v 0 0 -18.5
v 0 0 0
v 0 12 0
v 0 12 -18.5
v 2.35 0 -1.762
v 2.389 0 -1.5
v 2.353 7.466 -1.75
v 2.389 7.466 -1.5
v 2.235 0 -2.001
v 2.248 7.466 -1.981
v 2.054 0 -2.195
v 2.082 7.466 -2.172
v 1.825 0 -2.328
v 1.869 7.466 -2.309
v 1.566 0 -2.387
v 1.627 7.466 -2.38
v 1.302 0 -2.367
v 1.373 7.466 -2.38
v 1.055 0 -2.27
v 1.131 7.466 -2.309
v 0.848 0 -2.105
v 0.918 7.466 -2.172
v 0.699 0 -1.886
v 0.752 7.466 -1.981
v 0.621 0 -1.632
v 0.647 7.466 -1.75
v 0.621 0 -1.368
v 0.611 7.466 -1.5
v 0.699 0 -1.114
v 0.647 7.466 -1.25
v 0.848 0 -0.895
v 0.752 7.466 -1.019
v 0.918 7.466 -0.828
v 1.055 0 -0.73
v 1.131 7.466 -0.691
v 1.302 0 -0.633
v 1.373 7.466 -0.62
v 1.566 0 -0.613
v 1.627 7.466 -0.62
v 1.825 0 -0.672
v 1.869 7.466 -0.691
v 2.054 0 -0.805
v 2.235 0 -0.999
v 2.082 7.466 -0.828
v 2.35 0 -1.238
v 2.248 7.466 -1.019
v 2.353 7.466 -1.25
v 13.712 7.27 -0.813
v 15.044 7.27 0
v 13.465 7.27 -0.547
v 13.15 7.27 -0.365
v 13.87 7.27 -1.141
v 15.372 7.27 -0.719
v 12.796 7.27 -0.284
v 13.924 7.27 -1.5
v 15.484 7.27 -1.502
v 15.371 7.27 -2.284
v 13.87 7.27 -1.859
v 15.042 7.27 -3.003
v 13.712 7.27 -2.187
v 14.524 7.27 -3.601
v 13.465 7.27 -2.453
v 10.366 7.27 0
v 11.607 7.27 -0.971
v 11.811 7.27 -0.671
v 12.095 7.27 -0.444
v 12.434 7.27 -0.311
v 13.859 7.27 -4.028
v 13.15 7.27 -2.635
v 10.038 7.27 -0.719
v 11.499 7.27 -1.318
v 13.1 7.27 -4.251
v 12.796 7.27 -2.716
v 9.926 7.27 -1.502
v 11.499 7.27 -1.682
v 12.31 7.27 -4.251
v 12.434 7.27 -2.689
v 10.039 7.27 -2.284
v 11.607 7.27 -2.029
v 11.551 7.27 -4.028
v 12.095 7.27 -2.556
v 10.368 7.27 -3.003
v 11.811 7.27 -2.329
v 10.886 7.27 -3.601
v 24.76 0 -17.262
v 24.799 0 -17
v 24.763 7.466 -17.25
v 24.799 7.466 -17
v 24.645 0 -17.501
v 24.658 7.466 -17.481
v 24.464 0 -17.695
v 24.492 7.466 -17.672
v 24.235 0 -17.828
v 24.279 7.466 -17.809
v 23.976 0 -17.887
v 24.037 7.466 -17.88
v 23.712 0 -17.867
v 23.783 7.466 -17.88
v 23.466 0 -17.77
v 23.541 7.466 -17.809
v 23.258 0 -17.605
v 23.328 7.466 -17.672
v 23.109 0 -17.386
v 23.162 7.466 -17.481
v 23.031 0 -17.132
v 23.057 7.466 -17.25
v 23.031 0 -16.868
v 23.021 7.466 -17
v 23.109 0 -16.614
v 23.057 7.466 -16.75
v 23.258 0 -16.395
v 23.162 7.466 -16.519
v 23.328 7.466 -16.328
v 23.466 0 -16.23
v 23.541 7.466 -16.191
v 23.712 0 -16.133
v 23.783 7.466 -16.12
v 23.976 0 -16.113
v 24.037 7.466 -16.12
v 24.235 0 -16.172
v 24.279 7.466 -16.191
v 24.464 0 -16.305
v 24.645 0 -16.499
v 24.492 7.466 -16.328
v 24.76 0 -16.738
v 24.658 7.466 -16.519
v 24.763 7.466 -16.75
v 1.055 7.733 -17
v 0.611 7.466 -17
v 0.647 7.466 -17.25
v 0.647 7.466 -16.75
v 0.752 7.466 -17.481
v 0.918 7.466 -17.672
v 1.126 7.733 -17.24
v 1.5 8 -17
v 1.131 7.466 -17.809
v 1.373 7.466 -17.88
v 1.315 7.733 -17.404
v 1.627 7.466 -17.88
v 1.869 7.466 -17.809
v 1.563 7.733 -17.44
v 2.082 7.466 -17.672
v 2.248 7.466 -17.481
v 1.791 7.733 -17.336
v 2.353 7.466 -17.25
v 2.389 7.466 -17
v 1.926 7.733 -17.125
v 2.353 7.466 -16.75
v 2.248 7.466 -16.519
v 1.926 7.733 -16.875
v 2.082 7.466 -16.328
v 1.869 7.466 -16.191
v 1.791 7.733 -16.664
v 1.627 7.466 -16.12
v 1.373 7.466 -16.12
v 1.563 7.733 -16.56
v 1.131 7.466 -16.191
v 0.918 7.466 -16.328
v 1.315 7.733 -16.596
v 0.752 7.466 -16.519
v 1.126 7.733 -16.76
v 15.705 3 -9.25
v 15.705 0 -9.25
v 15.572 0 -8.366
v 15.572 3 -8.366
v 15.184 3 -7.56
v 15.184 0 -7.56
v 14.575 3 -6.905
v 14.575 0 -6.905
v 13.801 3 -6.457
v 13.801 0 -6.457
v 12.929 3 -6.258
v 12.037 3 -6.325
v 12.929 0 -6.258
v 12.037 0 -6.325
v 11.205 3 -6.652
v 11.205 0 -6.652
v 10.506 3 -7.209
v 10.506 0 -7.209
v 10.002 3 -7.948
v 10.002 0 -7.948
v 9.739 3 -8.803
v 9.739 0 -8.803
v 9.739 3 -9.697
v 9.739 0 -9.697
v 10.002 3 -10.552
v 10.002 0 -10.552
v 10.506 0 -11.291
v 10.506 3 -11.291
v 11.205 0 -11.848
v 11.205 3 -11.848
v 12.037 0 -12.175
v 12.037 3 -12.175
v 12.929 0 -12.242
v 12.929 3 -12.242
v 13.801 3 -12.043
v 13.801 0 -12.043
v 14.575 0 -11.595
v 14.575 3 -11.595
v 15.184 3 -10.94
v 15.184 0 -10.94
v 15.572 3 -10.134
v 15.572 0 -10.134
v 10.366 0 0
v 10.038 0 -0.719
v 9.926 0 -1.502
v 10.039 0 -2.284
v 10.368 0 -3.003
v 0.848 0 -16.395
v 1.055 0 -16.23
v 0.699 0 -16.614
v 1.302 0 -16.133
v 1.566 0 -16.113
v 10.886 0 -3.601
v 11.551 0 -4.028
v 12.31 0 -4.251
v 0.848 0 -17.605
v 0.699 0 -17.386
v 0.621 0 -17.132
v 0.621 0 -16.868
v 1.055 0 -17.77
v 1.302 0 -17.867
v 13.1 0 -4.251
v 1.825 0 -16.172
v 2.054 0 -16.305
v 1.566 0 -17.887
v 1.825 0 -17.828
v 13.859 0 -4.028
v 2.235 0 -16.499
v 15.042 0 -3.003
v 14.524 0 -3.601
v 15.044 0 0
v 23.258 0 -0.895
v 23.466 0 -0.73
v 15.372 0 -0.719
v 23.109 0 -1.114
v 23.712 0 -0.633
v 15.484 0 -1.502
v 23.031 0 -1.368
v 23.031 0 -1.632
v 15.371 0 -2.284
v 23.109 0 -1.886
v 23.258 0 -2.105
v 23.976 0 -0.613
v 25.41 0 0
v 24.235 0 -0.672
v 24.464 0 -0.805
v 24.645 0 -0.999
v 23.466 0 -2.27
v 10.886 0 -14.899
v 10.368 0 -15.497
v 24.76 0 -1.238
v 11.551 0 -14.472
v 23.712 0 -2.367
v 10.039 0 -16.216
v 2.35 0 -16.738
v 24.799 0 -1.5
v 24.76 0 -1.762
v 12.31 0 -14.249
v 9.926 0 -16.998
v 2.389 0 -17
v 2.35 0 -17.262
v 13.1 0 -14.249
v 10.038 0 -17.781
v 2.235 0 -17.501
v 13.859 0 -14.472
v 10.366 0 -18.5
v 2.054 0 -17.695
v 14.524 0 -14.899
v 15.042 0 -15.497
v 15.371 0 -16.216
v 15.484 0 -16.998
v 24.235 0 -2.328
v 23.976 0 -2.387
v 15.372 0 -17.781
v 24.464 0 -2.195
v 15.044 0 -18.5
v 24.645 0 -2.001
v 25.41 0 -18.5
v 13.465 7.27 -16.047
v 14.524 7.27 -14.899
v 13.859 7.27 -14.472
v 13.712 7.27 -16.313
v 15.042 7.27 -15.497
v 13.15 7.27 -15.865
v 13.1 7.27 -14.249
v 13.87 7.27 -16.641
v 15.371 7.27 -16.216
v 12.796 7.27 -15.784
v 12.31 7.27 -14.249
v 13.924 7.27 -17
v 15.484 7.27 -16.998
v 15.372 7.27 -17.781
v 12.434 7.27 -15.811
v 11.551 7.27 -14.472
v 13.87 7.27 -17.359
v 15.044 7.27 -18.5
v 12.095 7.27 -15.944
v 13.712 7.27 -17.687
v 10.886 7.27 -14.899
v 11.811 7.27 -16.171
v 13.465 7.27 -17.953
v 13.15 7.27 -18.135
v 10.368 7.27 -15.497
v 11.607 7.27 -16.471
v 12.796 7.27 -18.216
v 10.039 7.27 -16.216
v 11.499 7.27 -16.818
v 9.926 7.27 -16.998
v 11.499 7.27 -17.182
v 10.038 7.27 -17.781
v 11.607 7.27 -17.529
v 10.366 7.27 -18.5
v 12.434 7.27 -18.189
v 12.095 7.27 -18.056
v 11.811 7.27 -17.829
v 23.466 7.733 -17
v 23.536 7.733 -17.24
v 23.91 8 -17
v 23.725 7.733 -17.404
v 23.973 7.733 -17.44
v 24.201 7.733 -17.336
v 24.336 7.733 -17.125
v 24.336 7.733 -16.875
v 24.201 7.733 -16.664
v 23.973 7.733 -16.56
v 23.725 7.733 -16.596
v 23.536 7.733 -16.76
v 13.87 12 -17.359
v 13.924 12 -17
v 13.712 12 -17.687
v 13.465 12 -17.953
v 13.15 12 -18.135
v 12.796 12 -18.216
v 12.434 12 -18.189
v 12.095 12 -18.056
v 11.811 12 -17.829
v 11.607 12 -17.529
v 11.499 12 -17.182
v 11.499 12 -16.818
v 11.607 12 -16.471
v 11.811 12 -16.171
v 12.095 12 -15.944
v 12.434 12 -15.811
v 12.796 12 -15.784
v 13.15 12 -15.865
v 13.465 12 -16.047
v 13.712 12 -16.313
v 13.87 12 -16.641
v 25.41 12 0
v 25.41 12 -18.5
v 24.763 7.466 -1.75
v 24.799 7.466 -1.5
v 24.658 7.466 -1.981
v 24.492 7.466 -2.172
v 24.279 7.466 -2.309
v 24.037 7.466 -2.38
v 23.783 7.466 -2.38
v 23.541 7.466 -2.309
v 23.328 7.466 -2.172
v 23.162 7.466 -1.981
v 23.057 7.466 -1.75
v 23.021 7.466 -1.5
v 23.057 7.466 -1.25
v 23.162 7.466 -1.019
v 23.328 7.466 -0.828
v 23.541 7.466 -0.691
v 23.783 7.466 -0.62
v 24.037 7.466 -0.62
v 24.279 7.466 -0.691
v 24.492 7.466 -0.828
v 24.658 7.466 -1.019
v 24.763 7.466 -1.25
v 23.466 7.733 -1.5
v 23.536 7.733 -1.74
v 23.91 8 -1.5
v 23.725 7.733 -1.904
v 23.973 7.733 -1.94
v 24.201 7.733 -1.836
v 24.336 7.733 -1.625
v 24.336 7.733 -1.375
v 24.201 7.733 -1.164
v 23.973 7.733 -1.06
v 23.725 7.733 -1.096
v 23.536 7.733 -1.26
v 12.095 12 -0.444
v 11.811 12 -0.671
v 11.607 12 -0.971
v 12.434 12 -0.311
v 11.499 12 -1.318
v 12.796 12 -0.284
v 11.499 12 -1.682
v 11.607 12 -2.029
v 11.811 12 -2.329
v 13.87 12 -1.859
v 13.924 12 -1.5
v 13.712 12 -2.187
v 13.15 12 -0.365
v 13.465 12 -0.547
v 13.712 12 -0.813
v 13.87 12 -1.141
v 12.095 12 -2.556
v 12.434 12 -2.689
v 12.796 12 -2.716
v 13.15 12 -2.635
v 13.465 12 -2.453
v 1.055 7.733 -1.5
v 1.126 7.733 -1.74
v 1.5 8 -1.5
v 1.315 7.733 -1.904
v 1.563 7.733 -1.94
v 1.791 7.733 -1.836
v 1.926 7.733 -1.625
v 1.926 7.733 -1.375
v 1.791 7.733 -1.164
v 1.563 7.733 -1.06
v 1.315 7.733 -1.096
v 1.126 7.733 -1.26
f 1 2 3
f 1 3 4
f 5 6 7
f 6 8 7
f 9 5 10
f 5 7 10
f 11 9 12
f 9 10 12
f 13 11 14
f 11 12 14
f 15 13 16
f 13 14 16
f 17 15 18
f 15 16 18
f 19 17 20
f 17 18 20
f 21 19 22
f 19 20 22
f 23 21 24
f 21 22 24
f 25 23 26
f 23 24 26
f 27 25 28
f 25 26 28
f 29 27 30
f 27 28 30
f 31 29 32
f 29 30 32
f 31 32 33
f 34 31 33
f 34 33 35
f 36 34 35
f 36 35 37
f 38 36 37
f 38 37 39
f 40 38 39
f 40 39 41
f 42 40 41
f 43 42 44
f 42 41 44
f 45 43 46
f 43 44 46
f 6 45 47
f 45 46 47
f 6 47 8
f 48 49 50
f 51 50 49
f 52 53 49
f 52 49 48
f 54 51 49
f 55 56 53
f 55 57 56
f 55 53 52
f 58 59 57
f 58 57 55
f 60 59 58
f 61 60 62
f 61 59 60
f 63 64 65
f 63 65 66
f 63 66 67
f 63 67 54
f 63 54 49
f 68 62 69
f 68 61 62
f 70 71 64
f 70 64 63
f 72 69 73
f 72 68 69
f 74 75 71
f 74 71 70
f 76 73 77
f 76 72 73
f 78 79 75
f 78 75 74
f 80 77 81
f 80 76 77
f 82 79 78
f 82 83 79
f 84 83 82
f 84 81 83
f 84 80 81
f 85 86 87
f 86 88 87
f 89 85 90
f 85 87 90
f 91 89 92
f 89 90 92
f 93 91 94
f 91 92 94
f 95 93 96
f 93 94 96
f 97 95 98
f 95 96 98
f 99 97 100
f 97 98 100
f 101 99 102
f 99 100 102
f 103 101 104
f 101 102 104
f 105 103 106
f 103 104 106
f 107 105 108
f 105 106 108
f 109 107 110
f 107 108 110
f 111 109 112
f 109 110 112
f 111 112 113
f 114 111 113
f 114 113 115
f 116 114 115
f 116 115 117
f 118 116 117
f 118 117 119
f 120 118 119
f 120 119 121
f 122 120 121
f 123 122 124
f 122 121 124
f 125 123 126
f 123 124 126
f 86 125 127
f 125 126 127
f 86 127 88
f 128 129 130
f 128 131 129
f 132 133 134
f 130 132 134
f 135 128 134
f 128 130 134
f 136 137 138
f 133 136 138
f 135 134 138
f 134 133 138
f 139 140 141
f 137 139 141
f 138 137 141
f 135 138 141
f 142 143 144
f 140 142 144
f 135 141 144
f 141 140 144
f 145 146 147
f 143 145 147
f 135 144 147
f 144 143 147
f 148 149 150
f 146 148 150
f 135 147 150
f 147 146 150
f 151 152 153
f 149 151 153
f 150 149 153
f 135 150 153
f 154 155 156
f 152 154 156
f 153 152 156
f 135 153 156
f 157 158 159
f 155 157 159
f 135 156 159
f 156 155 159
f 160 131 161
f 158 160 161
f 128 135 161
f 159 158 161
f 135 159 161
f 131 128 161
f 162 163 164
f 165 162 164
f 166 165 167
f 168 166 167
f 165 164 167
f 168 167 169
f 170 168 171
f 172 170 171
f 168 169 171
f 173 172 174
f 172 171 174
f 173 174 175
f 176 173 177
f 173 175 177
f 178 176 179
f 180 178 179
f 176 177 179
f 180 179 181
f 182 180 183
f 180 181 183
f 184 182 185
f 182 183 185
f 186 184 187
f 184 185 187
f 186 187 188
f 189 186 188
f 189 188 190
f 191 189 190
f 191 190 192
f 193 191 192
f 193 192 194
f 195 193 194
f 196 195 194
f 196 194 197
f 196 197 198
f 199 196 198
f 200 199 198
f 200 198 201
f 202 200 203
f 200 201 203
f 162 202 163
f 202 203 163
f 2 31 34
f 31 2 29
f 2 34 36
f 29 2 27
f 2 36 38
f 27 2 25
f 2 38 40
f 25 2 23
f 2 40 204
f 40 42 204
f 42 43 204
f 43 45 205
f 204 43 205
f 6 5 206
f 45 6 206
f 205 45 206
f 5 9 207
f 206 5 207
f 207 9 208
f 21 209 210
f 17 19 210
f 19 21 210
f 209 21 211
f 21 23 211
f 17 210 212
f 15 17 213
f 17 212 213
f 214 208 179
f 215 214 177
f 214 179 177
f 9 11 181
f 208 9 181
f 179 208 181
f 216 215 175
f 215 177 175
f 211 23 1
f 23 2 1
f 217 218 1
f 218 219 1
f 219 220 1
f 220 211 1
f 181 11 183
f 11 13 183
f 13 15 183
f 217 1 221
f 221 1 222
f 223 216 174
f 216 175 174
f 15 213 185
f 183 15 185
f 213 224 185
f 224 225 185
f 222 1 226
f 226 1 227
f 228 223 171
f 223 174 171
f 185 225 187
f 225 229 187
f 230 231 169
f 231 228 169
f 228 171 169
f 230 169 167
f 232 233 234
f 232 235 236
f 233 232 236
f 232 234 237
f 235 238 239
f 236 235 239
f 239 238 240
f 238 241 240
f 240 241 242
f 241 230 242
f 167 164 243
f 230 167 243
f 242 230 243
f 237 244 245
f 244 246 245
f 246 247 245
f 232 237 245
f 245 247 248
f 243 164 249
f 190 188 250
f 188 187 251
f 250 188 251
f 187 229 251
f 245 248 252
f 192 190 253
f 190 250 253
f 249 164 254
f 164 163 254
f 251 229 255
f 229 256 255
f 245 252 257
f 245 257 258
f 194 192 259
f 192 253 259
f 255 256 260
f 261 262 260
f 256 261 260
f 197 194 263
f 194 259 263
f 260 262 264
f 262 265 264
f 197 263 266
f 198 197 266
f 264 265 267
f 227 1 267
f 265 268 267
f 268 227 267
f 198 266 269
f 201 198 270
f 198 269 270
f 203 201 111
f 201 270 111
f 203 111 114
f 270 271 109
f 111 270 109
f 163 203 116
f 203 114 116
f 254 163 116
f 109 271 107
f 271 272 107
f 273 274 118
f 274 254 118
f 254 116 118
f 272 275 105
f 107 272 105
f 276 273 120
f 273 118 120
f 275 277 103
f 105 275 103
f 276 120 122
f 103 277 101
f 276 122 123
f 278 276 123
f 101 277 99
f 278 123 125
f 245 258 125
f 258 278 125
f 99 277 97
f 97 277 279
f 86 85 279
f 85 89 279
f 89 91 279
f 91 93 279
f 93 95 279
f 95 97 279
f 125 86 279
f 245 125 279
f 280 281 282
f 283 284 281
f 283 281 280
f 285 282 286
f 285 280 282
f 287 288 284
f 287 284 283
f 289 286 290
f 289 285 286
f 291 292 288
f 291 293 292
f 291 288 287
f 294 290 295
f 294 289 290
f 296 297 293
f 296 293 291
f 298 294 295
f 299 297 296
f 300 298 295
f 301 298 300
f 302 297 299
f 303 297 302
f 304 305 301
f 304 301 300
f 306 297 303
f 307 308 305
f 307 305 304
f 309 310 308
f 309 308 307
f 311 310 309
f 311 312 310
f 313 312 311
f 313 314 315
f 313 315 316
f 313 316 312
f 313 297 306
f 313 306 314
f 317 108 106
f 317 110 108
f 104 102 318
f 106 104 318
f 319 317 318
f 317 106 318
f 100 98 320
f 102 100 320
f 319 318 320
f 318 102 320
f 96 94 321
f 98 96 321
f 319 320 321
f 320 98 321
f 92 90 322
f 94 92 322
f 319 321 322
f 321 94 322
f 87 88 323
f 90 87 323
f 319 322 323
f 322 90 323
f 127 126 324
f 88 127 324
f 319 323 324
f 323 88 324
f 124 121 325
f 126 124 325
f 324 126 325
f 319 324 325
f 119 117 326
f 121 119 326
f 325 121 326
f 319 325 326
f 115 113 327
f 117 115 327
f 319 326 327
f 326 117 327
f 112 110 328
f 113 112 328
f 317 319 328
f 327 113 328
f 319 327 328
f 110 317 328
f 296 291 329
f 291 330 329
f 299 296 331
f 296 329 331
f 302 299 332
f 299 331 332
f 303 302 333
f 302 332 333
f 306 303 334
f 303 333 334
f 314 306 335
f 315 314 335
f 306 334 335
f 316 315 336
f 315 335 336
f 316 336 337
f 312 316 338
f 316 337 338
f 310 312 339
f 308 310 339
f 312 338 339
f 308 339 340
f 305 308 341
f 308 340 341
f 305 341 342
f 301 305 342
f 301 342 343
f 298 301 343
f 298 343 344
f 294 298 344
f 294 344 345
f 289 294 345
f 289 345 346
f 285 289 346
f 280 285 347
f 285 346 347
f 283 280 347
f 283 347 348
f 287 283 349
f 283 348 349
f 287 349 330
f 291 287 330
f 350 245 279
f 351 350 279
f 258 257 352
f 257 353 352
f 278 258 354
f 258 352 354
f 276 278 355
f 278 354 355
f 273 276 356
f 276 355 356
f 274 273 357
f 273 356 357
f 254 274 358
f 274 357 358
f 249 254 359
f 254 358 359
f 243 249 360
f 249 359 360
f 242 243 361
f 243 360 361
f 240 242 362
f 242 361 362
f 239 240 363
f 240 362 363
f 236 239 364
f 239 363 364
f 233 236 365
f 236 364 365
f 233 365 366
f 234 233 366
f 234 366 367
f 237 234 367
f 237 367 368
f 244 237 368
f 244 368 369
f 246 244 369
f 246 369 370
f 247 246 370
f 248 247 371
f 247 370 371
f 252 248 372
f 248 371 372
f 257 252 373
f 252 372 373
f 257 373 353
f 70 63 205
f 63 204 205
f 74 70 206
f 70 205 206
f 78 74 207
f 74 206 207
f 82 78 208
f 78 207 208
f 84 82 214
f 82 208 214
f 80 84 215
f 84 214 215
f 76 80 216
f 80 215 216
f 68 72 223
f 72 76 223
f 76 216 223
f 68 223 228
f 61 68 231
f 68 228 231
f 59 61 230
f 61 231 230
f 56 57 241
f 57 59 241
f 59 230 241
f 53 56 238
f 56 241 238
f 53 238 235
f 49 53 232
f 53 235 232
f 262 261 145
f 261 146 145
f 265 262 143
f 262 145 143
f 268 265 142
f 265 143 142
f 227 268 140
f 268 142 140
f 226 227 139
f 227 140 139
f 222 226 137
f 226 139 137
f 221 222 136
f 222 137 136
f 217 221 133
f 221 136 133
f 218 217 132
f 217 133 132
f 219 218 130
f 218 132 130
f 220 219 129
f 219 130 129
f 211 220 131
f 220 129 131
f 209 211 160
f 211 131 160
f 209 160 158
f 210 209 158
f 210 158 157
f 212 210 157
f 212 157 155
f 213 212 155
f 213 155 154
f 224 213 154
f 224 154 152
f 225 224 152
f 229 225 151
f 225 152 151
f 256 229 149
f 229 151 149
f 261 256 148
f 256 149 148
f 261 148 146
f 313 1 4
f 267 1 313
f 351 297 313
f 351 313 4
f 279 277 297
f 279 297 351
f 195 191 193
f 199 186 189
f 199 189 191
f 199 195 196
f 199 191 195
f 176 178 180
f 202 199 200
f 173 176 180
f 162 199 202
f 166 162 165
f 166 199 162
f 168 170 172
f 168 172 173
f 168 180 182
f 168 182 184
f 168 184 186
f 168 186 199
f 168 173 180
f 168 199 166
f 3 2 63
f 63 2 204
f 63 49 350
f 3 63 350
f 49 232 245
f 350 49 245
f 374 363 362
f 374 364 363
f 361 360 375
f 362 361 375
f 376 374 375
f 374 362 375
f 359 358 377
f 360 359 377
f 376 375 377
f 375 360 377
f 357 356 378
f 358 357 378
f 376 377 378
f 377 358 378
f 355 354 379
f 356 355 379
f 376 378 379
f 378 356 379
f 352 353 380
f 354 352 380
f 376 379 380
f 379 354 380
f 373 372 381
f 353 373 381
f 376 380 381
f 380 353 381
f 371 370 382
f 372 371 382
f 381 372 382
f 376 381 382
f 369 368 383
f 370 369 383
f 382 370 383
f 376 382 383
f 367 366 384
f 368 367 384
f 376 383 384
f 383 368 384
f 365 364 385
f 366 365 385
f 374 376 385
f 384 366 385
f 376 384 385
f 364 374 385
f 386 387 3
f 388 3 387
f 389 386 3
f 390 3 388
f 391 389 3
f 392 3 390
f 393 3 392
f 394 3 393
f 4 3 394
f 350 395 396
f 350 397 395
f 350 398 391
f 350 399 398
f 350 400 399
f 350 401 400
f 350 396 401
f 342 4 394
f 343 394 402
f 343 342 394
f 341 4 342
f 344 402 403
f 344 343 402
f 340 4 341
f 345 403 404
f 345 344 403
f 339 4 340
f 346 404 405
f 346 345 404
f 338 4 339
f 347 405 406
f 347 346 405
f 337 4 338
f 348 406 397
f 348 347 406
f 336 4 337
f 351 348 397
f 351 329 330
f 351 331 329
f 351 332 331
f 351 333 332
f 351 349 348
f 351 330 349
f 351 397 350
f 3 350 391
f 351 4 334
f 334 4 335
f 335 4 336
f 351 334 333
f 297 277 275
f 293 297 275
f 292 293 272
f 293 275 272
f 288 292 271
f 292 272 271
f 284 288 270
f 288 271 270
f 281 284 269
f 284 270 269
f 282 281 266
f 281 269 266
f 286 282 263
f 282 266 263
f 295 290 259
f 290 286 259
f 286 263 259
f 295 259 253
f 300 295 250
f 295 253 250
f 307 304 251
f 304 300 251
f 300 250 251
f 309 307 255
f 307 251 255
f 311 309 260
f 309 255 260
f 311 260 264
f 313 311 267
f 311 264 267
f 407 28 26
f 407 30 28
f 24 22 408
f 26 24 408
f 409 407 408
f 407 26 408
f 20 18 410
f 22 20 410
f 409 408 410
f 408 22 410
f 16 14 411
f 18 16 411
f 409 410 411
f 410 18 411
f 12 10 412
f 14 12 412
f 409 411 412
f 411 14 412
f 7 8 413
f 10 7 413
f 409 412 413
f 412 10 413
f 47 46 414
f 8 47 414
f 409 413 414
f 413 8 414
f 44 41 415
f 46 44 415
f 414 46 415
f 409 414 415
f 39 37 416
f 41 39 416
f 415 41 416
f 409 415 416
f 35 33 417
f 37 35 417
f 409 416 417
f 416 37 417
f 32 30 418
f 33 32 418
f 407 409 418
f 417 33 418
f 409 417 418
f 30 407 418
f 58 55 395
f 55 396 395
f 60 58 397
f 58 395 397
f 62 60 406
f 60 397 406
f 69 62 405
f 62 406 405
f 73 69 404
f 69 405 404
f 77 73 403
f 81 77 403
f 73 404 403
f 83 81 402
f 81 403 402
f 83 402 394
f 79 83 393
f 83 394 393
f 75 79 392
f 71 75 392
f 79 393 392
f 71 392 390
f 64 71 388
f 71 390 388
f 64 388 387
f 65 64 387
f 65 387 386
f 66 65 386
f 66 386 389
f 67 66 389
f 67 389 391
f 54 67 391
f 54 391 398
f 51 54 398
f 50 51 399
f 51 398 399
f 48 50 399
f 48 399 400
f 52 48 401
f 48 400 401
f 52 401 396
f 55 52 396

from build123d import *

# Parameters (mm, degrees)
SKETCH1_W                                           = 25.41
SKETCH1_H                                           = 18.5
BOSS_EXTRUDE1_DEPTH                                 = 12
F_2_56_TAPPED_HOLE1_D                               = 1.778
F_2_56_TAPPED_HOLE1_DEPTH                           = 7.46583491
F_2_56_TAPPED_HOLE1_TIP                             = 0.53416509
SKETCH5_R                                           = 3
CUT_EXTRUDE1_DEPTH                                  = 3
CBORE_FOR_2_BINDING_HEAD_MACHINE_SCREW3_D           = 2.4384
CBORE_FOR_2_BINDING_HEAD_MACHINE_SCREW3_CBORE_D     = 5.55752
CBORE_FOR_2_BINDING_HEAD_MACHINE_SCREW3_CBORE_DEPTH = 7.269988


with BuildPart() as part:
    # Sketch1 → Boss-Extrude1 (new body)
    with BuildSketch(Plane(origin=(0, 0, 0), x_dir=(1, 0, 0), z_dir=(0, 1, 0))):
        with Locations((12.705, 9.25)):
            Rectangle(SKETCH1_W, SKETCH1_H)
    extrude(amount=BOSS_EXTRUDE1_DEPTH)

    # #2-56 Tapped Hole1
    with Locations(Plane(origin=(0, 0, 0), x_dir=(-1, 0, 0), z_dir=(0, -1, 0))):
        with Locations((-23.91, 17), (-23.91, 1.5), (-1.5, 1.5), (-1.5, 17)):
            Hole(F_2_56_TAPPED_HOLE1_D / 2, depth=F_2_56_TAPPED_HOLE1_DEPTH)
            with Locations((0, 0, -(F_2_56_TAPPED_HOLE1_DEPTH + F_2_56_TAPPED_HOLE1_TIP / 2))):  # 118° drill point
                Cone(0, F_2_56_TAPPED_HOLE1_D / 2, F_2_56_TAPPED_HOLE1_TIP, mode=Mode.SUBTRACT)

    # Sketch5 → Cut-Extrude1 (cut)
    with BuildSketch(Plane.XZ):
        with Locations((12.705, -9.25)):
            Circle(SKETCH5_R)
    extrude(amount=-CUT_EXTRUDE1_DEPTH, mode=Mode.SUBTRACT)

    # CBORE for #2 Binding Head Machine Screw3 (through all)
    with Locations(Plane(origin=(0, 0, 0), x_dir=(-1, 0, 0), z_dir=(0, -1, 0))):
        with Locations((-12.705, 17), (-12.705, 1.5)):
            CounterBoreHole(CBORE_FOR_2_BINDING_HEAD_MACHINE_SCREW3_D / 2, CBORE_FOR_2_BINDING_HEAD_MACHINE_SCREW3_CBORE_D / 2, CBORE_FOR_2_BINDING_HEAD_MACHINE_SCREW3_CBORE_DEPTH)


solid = part.part
